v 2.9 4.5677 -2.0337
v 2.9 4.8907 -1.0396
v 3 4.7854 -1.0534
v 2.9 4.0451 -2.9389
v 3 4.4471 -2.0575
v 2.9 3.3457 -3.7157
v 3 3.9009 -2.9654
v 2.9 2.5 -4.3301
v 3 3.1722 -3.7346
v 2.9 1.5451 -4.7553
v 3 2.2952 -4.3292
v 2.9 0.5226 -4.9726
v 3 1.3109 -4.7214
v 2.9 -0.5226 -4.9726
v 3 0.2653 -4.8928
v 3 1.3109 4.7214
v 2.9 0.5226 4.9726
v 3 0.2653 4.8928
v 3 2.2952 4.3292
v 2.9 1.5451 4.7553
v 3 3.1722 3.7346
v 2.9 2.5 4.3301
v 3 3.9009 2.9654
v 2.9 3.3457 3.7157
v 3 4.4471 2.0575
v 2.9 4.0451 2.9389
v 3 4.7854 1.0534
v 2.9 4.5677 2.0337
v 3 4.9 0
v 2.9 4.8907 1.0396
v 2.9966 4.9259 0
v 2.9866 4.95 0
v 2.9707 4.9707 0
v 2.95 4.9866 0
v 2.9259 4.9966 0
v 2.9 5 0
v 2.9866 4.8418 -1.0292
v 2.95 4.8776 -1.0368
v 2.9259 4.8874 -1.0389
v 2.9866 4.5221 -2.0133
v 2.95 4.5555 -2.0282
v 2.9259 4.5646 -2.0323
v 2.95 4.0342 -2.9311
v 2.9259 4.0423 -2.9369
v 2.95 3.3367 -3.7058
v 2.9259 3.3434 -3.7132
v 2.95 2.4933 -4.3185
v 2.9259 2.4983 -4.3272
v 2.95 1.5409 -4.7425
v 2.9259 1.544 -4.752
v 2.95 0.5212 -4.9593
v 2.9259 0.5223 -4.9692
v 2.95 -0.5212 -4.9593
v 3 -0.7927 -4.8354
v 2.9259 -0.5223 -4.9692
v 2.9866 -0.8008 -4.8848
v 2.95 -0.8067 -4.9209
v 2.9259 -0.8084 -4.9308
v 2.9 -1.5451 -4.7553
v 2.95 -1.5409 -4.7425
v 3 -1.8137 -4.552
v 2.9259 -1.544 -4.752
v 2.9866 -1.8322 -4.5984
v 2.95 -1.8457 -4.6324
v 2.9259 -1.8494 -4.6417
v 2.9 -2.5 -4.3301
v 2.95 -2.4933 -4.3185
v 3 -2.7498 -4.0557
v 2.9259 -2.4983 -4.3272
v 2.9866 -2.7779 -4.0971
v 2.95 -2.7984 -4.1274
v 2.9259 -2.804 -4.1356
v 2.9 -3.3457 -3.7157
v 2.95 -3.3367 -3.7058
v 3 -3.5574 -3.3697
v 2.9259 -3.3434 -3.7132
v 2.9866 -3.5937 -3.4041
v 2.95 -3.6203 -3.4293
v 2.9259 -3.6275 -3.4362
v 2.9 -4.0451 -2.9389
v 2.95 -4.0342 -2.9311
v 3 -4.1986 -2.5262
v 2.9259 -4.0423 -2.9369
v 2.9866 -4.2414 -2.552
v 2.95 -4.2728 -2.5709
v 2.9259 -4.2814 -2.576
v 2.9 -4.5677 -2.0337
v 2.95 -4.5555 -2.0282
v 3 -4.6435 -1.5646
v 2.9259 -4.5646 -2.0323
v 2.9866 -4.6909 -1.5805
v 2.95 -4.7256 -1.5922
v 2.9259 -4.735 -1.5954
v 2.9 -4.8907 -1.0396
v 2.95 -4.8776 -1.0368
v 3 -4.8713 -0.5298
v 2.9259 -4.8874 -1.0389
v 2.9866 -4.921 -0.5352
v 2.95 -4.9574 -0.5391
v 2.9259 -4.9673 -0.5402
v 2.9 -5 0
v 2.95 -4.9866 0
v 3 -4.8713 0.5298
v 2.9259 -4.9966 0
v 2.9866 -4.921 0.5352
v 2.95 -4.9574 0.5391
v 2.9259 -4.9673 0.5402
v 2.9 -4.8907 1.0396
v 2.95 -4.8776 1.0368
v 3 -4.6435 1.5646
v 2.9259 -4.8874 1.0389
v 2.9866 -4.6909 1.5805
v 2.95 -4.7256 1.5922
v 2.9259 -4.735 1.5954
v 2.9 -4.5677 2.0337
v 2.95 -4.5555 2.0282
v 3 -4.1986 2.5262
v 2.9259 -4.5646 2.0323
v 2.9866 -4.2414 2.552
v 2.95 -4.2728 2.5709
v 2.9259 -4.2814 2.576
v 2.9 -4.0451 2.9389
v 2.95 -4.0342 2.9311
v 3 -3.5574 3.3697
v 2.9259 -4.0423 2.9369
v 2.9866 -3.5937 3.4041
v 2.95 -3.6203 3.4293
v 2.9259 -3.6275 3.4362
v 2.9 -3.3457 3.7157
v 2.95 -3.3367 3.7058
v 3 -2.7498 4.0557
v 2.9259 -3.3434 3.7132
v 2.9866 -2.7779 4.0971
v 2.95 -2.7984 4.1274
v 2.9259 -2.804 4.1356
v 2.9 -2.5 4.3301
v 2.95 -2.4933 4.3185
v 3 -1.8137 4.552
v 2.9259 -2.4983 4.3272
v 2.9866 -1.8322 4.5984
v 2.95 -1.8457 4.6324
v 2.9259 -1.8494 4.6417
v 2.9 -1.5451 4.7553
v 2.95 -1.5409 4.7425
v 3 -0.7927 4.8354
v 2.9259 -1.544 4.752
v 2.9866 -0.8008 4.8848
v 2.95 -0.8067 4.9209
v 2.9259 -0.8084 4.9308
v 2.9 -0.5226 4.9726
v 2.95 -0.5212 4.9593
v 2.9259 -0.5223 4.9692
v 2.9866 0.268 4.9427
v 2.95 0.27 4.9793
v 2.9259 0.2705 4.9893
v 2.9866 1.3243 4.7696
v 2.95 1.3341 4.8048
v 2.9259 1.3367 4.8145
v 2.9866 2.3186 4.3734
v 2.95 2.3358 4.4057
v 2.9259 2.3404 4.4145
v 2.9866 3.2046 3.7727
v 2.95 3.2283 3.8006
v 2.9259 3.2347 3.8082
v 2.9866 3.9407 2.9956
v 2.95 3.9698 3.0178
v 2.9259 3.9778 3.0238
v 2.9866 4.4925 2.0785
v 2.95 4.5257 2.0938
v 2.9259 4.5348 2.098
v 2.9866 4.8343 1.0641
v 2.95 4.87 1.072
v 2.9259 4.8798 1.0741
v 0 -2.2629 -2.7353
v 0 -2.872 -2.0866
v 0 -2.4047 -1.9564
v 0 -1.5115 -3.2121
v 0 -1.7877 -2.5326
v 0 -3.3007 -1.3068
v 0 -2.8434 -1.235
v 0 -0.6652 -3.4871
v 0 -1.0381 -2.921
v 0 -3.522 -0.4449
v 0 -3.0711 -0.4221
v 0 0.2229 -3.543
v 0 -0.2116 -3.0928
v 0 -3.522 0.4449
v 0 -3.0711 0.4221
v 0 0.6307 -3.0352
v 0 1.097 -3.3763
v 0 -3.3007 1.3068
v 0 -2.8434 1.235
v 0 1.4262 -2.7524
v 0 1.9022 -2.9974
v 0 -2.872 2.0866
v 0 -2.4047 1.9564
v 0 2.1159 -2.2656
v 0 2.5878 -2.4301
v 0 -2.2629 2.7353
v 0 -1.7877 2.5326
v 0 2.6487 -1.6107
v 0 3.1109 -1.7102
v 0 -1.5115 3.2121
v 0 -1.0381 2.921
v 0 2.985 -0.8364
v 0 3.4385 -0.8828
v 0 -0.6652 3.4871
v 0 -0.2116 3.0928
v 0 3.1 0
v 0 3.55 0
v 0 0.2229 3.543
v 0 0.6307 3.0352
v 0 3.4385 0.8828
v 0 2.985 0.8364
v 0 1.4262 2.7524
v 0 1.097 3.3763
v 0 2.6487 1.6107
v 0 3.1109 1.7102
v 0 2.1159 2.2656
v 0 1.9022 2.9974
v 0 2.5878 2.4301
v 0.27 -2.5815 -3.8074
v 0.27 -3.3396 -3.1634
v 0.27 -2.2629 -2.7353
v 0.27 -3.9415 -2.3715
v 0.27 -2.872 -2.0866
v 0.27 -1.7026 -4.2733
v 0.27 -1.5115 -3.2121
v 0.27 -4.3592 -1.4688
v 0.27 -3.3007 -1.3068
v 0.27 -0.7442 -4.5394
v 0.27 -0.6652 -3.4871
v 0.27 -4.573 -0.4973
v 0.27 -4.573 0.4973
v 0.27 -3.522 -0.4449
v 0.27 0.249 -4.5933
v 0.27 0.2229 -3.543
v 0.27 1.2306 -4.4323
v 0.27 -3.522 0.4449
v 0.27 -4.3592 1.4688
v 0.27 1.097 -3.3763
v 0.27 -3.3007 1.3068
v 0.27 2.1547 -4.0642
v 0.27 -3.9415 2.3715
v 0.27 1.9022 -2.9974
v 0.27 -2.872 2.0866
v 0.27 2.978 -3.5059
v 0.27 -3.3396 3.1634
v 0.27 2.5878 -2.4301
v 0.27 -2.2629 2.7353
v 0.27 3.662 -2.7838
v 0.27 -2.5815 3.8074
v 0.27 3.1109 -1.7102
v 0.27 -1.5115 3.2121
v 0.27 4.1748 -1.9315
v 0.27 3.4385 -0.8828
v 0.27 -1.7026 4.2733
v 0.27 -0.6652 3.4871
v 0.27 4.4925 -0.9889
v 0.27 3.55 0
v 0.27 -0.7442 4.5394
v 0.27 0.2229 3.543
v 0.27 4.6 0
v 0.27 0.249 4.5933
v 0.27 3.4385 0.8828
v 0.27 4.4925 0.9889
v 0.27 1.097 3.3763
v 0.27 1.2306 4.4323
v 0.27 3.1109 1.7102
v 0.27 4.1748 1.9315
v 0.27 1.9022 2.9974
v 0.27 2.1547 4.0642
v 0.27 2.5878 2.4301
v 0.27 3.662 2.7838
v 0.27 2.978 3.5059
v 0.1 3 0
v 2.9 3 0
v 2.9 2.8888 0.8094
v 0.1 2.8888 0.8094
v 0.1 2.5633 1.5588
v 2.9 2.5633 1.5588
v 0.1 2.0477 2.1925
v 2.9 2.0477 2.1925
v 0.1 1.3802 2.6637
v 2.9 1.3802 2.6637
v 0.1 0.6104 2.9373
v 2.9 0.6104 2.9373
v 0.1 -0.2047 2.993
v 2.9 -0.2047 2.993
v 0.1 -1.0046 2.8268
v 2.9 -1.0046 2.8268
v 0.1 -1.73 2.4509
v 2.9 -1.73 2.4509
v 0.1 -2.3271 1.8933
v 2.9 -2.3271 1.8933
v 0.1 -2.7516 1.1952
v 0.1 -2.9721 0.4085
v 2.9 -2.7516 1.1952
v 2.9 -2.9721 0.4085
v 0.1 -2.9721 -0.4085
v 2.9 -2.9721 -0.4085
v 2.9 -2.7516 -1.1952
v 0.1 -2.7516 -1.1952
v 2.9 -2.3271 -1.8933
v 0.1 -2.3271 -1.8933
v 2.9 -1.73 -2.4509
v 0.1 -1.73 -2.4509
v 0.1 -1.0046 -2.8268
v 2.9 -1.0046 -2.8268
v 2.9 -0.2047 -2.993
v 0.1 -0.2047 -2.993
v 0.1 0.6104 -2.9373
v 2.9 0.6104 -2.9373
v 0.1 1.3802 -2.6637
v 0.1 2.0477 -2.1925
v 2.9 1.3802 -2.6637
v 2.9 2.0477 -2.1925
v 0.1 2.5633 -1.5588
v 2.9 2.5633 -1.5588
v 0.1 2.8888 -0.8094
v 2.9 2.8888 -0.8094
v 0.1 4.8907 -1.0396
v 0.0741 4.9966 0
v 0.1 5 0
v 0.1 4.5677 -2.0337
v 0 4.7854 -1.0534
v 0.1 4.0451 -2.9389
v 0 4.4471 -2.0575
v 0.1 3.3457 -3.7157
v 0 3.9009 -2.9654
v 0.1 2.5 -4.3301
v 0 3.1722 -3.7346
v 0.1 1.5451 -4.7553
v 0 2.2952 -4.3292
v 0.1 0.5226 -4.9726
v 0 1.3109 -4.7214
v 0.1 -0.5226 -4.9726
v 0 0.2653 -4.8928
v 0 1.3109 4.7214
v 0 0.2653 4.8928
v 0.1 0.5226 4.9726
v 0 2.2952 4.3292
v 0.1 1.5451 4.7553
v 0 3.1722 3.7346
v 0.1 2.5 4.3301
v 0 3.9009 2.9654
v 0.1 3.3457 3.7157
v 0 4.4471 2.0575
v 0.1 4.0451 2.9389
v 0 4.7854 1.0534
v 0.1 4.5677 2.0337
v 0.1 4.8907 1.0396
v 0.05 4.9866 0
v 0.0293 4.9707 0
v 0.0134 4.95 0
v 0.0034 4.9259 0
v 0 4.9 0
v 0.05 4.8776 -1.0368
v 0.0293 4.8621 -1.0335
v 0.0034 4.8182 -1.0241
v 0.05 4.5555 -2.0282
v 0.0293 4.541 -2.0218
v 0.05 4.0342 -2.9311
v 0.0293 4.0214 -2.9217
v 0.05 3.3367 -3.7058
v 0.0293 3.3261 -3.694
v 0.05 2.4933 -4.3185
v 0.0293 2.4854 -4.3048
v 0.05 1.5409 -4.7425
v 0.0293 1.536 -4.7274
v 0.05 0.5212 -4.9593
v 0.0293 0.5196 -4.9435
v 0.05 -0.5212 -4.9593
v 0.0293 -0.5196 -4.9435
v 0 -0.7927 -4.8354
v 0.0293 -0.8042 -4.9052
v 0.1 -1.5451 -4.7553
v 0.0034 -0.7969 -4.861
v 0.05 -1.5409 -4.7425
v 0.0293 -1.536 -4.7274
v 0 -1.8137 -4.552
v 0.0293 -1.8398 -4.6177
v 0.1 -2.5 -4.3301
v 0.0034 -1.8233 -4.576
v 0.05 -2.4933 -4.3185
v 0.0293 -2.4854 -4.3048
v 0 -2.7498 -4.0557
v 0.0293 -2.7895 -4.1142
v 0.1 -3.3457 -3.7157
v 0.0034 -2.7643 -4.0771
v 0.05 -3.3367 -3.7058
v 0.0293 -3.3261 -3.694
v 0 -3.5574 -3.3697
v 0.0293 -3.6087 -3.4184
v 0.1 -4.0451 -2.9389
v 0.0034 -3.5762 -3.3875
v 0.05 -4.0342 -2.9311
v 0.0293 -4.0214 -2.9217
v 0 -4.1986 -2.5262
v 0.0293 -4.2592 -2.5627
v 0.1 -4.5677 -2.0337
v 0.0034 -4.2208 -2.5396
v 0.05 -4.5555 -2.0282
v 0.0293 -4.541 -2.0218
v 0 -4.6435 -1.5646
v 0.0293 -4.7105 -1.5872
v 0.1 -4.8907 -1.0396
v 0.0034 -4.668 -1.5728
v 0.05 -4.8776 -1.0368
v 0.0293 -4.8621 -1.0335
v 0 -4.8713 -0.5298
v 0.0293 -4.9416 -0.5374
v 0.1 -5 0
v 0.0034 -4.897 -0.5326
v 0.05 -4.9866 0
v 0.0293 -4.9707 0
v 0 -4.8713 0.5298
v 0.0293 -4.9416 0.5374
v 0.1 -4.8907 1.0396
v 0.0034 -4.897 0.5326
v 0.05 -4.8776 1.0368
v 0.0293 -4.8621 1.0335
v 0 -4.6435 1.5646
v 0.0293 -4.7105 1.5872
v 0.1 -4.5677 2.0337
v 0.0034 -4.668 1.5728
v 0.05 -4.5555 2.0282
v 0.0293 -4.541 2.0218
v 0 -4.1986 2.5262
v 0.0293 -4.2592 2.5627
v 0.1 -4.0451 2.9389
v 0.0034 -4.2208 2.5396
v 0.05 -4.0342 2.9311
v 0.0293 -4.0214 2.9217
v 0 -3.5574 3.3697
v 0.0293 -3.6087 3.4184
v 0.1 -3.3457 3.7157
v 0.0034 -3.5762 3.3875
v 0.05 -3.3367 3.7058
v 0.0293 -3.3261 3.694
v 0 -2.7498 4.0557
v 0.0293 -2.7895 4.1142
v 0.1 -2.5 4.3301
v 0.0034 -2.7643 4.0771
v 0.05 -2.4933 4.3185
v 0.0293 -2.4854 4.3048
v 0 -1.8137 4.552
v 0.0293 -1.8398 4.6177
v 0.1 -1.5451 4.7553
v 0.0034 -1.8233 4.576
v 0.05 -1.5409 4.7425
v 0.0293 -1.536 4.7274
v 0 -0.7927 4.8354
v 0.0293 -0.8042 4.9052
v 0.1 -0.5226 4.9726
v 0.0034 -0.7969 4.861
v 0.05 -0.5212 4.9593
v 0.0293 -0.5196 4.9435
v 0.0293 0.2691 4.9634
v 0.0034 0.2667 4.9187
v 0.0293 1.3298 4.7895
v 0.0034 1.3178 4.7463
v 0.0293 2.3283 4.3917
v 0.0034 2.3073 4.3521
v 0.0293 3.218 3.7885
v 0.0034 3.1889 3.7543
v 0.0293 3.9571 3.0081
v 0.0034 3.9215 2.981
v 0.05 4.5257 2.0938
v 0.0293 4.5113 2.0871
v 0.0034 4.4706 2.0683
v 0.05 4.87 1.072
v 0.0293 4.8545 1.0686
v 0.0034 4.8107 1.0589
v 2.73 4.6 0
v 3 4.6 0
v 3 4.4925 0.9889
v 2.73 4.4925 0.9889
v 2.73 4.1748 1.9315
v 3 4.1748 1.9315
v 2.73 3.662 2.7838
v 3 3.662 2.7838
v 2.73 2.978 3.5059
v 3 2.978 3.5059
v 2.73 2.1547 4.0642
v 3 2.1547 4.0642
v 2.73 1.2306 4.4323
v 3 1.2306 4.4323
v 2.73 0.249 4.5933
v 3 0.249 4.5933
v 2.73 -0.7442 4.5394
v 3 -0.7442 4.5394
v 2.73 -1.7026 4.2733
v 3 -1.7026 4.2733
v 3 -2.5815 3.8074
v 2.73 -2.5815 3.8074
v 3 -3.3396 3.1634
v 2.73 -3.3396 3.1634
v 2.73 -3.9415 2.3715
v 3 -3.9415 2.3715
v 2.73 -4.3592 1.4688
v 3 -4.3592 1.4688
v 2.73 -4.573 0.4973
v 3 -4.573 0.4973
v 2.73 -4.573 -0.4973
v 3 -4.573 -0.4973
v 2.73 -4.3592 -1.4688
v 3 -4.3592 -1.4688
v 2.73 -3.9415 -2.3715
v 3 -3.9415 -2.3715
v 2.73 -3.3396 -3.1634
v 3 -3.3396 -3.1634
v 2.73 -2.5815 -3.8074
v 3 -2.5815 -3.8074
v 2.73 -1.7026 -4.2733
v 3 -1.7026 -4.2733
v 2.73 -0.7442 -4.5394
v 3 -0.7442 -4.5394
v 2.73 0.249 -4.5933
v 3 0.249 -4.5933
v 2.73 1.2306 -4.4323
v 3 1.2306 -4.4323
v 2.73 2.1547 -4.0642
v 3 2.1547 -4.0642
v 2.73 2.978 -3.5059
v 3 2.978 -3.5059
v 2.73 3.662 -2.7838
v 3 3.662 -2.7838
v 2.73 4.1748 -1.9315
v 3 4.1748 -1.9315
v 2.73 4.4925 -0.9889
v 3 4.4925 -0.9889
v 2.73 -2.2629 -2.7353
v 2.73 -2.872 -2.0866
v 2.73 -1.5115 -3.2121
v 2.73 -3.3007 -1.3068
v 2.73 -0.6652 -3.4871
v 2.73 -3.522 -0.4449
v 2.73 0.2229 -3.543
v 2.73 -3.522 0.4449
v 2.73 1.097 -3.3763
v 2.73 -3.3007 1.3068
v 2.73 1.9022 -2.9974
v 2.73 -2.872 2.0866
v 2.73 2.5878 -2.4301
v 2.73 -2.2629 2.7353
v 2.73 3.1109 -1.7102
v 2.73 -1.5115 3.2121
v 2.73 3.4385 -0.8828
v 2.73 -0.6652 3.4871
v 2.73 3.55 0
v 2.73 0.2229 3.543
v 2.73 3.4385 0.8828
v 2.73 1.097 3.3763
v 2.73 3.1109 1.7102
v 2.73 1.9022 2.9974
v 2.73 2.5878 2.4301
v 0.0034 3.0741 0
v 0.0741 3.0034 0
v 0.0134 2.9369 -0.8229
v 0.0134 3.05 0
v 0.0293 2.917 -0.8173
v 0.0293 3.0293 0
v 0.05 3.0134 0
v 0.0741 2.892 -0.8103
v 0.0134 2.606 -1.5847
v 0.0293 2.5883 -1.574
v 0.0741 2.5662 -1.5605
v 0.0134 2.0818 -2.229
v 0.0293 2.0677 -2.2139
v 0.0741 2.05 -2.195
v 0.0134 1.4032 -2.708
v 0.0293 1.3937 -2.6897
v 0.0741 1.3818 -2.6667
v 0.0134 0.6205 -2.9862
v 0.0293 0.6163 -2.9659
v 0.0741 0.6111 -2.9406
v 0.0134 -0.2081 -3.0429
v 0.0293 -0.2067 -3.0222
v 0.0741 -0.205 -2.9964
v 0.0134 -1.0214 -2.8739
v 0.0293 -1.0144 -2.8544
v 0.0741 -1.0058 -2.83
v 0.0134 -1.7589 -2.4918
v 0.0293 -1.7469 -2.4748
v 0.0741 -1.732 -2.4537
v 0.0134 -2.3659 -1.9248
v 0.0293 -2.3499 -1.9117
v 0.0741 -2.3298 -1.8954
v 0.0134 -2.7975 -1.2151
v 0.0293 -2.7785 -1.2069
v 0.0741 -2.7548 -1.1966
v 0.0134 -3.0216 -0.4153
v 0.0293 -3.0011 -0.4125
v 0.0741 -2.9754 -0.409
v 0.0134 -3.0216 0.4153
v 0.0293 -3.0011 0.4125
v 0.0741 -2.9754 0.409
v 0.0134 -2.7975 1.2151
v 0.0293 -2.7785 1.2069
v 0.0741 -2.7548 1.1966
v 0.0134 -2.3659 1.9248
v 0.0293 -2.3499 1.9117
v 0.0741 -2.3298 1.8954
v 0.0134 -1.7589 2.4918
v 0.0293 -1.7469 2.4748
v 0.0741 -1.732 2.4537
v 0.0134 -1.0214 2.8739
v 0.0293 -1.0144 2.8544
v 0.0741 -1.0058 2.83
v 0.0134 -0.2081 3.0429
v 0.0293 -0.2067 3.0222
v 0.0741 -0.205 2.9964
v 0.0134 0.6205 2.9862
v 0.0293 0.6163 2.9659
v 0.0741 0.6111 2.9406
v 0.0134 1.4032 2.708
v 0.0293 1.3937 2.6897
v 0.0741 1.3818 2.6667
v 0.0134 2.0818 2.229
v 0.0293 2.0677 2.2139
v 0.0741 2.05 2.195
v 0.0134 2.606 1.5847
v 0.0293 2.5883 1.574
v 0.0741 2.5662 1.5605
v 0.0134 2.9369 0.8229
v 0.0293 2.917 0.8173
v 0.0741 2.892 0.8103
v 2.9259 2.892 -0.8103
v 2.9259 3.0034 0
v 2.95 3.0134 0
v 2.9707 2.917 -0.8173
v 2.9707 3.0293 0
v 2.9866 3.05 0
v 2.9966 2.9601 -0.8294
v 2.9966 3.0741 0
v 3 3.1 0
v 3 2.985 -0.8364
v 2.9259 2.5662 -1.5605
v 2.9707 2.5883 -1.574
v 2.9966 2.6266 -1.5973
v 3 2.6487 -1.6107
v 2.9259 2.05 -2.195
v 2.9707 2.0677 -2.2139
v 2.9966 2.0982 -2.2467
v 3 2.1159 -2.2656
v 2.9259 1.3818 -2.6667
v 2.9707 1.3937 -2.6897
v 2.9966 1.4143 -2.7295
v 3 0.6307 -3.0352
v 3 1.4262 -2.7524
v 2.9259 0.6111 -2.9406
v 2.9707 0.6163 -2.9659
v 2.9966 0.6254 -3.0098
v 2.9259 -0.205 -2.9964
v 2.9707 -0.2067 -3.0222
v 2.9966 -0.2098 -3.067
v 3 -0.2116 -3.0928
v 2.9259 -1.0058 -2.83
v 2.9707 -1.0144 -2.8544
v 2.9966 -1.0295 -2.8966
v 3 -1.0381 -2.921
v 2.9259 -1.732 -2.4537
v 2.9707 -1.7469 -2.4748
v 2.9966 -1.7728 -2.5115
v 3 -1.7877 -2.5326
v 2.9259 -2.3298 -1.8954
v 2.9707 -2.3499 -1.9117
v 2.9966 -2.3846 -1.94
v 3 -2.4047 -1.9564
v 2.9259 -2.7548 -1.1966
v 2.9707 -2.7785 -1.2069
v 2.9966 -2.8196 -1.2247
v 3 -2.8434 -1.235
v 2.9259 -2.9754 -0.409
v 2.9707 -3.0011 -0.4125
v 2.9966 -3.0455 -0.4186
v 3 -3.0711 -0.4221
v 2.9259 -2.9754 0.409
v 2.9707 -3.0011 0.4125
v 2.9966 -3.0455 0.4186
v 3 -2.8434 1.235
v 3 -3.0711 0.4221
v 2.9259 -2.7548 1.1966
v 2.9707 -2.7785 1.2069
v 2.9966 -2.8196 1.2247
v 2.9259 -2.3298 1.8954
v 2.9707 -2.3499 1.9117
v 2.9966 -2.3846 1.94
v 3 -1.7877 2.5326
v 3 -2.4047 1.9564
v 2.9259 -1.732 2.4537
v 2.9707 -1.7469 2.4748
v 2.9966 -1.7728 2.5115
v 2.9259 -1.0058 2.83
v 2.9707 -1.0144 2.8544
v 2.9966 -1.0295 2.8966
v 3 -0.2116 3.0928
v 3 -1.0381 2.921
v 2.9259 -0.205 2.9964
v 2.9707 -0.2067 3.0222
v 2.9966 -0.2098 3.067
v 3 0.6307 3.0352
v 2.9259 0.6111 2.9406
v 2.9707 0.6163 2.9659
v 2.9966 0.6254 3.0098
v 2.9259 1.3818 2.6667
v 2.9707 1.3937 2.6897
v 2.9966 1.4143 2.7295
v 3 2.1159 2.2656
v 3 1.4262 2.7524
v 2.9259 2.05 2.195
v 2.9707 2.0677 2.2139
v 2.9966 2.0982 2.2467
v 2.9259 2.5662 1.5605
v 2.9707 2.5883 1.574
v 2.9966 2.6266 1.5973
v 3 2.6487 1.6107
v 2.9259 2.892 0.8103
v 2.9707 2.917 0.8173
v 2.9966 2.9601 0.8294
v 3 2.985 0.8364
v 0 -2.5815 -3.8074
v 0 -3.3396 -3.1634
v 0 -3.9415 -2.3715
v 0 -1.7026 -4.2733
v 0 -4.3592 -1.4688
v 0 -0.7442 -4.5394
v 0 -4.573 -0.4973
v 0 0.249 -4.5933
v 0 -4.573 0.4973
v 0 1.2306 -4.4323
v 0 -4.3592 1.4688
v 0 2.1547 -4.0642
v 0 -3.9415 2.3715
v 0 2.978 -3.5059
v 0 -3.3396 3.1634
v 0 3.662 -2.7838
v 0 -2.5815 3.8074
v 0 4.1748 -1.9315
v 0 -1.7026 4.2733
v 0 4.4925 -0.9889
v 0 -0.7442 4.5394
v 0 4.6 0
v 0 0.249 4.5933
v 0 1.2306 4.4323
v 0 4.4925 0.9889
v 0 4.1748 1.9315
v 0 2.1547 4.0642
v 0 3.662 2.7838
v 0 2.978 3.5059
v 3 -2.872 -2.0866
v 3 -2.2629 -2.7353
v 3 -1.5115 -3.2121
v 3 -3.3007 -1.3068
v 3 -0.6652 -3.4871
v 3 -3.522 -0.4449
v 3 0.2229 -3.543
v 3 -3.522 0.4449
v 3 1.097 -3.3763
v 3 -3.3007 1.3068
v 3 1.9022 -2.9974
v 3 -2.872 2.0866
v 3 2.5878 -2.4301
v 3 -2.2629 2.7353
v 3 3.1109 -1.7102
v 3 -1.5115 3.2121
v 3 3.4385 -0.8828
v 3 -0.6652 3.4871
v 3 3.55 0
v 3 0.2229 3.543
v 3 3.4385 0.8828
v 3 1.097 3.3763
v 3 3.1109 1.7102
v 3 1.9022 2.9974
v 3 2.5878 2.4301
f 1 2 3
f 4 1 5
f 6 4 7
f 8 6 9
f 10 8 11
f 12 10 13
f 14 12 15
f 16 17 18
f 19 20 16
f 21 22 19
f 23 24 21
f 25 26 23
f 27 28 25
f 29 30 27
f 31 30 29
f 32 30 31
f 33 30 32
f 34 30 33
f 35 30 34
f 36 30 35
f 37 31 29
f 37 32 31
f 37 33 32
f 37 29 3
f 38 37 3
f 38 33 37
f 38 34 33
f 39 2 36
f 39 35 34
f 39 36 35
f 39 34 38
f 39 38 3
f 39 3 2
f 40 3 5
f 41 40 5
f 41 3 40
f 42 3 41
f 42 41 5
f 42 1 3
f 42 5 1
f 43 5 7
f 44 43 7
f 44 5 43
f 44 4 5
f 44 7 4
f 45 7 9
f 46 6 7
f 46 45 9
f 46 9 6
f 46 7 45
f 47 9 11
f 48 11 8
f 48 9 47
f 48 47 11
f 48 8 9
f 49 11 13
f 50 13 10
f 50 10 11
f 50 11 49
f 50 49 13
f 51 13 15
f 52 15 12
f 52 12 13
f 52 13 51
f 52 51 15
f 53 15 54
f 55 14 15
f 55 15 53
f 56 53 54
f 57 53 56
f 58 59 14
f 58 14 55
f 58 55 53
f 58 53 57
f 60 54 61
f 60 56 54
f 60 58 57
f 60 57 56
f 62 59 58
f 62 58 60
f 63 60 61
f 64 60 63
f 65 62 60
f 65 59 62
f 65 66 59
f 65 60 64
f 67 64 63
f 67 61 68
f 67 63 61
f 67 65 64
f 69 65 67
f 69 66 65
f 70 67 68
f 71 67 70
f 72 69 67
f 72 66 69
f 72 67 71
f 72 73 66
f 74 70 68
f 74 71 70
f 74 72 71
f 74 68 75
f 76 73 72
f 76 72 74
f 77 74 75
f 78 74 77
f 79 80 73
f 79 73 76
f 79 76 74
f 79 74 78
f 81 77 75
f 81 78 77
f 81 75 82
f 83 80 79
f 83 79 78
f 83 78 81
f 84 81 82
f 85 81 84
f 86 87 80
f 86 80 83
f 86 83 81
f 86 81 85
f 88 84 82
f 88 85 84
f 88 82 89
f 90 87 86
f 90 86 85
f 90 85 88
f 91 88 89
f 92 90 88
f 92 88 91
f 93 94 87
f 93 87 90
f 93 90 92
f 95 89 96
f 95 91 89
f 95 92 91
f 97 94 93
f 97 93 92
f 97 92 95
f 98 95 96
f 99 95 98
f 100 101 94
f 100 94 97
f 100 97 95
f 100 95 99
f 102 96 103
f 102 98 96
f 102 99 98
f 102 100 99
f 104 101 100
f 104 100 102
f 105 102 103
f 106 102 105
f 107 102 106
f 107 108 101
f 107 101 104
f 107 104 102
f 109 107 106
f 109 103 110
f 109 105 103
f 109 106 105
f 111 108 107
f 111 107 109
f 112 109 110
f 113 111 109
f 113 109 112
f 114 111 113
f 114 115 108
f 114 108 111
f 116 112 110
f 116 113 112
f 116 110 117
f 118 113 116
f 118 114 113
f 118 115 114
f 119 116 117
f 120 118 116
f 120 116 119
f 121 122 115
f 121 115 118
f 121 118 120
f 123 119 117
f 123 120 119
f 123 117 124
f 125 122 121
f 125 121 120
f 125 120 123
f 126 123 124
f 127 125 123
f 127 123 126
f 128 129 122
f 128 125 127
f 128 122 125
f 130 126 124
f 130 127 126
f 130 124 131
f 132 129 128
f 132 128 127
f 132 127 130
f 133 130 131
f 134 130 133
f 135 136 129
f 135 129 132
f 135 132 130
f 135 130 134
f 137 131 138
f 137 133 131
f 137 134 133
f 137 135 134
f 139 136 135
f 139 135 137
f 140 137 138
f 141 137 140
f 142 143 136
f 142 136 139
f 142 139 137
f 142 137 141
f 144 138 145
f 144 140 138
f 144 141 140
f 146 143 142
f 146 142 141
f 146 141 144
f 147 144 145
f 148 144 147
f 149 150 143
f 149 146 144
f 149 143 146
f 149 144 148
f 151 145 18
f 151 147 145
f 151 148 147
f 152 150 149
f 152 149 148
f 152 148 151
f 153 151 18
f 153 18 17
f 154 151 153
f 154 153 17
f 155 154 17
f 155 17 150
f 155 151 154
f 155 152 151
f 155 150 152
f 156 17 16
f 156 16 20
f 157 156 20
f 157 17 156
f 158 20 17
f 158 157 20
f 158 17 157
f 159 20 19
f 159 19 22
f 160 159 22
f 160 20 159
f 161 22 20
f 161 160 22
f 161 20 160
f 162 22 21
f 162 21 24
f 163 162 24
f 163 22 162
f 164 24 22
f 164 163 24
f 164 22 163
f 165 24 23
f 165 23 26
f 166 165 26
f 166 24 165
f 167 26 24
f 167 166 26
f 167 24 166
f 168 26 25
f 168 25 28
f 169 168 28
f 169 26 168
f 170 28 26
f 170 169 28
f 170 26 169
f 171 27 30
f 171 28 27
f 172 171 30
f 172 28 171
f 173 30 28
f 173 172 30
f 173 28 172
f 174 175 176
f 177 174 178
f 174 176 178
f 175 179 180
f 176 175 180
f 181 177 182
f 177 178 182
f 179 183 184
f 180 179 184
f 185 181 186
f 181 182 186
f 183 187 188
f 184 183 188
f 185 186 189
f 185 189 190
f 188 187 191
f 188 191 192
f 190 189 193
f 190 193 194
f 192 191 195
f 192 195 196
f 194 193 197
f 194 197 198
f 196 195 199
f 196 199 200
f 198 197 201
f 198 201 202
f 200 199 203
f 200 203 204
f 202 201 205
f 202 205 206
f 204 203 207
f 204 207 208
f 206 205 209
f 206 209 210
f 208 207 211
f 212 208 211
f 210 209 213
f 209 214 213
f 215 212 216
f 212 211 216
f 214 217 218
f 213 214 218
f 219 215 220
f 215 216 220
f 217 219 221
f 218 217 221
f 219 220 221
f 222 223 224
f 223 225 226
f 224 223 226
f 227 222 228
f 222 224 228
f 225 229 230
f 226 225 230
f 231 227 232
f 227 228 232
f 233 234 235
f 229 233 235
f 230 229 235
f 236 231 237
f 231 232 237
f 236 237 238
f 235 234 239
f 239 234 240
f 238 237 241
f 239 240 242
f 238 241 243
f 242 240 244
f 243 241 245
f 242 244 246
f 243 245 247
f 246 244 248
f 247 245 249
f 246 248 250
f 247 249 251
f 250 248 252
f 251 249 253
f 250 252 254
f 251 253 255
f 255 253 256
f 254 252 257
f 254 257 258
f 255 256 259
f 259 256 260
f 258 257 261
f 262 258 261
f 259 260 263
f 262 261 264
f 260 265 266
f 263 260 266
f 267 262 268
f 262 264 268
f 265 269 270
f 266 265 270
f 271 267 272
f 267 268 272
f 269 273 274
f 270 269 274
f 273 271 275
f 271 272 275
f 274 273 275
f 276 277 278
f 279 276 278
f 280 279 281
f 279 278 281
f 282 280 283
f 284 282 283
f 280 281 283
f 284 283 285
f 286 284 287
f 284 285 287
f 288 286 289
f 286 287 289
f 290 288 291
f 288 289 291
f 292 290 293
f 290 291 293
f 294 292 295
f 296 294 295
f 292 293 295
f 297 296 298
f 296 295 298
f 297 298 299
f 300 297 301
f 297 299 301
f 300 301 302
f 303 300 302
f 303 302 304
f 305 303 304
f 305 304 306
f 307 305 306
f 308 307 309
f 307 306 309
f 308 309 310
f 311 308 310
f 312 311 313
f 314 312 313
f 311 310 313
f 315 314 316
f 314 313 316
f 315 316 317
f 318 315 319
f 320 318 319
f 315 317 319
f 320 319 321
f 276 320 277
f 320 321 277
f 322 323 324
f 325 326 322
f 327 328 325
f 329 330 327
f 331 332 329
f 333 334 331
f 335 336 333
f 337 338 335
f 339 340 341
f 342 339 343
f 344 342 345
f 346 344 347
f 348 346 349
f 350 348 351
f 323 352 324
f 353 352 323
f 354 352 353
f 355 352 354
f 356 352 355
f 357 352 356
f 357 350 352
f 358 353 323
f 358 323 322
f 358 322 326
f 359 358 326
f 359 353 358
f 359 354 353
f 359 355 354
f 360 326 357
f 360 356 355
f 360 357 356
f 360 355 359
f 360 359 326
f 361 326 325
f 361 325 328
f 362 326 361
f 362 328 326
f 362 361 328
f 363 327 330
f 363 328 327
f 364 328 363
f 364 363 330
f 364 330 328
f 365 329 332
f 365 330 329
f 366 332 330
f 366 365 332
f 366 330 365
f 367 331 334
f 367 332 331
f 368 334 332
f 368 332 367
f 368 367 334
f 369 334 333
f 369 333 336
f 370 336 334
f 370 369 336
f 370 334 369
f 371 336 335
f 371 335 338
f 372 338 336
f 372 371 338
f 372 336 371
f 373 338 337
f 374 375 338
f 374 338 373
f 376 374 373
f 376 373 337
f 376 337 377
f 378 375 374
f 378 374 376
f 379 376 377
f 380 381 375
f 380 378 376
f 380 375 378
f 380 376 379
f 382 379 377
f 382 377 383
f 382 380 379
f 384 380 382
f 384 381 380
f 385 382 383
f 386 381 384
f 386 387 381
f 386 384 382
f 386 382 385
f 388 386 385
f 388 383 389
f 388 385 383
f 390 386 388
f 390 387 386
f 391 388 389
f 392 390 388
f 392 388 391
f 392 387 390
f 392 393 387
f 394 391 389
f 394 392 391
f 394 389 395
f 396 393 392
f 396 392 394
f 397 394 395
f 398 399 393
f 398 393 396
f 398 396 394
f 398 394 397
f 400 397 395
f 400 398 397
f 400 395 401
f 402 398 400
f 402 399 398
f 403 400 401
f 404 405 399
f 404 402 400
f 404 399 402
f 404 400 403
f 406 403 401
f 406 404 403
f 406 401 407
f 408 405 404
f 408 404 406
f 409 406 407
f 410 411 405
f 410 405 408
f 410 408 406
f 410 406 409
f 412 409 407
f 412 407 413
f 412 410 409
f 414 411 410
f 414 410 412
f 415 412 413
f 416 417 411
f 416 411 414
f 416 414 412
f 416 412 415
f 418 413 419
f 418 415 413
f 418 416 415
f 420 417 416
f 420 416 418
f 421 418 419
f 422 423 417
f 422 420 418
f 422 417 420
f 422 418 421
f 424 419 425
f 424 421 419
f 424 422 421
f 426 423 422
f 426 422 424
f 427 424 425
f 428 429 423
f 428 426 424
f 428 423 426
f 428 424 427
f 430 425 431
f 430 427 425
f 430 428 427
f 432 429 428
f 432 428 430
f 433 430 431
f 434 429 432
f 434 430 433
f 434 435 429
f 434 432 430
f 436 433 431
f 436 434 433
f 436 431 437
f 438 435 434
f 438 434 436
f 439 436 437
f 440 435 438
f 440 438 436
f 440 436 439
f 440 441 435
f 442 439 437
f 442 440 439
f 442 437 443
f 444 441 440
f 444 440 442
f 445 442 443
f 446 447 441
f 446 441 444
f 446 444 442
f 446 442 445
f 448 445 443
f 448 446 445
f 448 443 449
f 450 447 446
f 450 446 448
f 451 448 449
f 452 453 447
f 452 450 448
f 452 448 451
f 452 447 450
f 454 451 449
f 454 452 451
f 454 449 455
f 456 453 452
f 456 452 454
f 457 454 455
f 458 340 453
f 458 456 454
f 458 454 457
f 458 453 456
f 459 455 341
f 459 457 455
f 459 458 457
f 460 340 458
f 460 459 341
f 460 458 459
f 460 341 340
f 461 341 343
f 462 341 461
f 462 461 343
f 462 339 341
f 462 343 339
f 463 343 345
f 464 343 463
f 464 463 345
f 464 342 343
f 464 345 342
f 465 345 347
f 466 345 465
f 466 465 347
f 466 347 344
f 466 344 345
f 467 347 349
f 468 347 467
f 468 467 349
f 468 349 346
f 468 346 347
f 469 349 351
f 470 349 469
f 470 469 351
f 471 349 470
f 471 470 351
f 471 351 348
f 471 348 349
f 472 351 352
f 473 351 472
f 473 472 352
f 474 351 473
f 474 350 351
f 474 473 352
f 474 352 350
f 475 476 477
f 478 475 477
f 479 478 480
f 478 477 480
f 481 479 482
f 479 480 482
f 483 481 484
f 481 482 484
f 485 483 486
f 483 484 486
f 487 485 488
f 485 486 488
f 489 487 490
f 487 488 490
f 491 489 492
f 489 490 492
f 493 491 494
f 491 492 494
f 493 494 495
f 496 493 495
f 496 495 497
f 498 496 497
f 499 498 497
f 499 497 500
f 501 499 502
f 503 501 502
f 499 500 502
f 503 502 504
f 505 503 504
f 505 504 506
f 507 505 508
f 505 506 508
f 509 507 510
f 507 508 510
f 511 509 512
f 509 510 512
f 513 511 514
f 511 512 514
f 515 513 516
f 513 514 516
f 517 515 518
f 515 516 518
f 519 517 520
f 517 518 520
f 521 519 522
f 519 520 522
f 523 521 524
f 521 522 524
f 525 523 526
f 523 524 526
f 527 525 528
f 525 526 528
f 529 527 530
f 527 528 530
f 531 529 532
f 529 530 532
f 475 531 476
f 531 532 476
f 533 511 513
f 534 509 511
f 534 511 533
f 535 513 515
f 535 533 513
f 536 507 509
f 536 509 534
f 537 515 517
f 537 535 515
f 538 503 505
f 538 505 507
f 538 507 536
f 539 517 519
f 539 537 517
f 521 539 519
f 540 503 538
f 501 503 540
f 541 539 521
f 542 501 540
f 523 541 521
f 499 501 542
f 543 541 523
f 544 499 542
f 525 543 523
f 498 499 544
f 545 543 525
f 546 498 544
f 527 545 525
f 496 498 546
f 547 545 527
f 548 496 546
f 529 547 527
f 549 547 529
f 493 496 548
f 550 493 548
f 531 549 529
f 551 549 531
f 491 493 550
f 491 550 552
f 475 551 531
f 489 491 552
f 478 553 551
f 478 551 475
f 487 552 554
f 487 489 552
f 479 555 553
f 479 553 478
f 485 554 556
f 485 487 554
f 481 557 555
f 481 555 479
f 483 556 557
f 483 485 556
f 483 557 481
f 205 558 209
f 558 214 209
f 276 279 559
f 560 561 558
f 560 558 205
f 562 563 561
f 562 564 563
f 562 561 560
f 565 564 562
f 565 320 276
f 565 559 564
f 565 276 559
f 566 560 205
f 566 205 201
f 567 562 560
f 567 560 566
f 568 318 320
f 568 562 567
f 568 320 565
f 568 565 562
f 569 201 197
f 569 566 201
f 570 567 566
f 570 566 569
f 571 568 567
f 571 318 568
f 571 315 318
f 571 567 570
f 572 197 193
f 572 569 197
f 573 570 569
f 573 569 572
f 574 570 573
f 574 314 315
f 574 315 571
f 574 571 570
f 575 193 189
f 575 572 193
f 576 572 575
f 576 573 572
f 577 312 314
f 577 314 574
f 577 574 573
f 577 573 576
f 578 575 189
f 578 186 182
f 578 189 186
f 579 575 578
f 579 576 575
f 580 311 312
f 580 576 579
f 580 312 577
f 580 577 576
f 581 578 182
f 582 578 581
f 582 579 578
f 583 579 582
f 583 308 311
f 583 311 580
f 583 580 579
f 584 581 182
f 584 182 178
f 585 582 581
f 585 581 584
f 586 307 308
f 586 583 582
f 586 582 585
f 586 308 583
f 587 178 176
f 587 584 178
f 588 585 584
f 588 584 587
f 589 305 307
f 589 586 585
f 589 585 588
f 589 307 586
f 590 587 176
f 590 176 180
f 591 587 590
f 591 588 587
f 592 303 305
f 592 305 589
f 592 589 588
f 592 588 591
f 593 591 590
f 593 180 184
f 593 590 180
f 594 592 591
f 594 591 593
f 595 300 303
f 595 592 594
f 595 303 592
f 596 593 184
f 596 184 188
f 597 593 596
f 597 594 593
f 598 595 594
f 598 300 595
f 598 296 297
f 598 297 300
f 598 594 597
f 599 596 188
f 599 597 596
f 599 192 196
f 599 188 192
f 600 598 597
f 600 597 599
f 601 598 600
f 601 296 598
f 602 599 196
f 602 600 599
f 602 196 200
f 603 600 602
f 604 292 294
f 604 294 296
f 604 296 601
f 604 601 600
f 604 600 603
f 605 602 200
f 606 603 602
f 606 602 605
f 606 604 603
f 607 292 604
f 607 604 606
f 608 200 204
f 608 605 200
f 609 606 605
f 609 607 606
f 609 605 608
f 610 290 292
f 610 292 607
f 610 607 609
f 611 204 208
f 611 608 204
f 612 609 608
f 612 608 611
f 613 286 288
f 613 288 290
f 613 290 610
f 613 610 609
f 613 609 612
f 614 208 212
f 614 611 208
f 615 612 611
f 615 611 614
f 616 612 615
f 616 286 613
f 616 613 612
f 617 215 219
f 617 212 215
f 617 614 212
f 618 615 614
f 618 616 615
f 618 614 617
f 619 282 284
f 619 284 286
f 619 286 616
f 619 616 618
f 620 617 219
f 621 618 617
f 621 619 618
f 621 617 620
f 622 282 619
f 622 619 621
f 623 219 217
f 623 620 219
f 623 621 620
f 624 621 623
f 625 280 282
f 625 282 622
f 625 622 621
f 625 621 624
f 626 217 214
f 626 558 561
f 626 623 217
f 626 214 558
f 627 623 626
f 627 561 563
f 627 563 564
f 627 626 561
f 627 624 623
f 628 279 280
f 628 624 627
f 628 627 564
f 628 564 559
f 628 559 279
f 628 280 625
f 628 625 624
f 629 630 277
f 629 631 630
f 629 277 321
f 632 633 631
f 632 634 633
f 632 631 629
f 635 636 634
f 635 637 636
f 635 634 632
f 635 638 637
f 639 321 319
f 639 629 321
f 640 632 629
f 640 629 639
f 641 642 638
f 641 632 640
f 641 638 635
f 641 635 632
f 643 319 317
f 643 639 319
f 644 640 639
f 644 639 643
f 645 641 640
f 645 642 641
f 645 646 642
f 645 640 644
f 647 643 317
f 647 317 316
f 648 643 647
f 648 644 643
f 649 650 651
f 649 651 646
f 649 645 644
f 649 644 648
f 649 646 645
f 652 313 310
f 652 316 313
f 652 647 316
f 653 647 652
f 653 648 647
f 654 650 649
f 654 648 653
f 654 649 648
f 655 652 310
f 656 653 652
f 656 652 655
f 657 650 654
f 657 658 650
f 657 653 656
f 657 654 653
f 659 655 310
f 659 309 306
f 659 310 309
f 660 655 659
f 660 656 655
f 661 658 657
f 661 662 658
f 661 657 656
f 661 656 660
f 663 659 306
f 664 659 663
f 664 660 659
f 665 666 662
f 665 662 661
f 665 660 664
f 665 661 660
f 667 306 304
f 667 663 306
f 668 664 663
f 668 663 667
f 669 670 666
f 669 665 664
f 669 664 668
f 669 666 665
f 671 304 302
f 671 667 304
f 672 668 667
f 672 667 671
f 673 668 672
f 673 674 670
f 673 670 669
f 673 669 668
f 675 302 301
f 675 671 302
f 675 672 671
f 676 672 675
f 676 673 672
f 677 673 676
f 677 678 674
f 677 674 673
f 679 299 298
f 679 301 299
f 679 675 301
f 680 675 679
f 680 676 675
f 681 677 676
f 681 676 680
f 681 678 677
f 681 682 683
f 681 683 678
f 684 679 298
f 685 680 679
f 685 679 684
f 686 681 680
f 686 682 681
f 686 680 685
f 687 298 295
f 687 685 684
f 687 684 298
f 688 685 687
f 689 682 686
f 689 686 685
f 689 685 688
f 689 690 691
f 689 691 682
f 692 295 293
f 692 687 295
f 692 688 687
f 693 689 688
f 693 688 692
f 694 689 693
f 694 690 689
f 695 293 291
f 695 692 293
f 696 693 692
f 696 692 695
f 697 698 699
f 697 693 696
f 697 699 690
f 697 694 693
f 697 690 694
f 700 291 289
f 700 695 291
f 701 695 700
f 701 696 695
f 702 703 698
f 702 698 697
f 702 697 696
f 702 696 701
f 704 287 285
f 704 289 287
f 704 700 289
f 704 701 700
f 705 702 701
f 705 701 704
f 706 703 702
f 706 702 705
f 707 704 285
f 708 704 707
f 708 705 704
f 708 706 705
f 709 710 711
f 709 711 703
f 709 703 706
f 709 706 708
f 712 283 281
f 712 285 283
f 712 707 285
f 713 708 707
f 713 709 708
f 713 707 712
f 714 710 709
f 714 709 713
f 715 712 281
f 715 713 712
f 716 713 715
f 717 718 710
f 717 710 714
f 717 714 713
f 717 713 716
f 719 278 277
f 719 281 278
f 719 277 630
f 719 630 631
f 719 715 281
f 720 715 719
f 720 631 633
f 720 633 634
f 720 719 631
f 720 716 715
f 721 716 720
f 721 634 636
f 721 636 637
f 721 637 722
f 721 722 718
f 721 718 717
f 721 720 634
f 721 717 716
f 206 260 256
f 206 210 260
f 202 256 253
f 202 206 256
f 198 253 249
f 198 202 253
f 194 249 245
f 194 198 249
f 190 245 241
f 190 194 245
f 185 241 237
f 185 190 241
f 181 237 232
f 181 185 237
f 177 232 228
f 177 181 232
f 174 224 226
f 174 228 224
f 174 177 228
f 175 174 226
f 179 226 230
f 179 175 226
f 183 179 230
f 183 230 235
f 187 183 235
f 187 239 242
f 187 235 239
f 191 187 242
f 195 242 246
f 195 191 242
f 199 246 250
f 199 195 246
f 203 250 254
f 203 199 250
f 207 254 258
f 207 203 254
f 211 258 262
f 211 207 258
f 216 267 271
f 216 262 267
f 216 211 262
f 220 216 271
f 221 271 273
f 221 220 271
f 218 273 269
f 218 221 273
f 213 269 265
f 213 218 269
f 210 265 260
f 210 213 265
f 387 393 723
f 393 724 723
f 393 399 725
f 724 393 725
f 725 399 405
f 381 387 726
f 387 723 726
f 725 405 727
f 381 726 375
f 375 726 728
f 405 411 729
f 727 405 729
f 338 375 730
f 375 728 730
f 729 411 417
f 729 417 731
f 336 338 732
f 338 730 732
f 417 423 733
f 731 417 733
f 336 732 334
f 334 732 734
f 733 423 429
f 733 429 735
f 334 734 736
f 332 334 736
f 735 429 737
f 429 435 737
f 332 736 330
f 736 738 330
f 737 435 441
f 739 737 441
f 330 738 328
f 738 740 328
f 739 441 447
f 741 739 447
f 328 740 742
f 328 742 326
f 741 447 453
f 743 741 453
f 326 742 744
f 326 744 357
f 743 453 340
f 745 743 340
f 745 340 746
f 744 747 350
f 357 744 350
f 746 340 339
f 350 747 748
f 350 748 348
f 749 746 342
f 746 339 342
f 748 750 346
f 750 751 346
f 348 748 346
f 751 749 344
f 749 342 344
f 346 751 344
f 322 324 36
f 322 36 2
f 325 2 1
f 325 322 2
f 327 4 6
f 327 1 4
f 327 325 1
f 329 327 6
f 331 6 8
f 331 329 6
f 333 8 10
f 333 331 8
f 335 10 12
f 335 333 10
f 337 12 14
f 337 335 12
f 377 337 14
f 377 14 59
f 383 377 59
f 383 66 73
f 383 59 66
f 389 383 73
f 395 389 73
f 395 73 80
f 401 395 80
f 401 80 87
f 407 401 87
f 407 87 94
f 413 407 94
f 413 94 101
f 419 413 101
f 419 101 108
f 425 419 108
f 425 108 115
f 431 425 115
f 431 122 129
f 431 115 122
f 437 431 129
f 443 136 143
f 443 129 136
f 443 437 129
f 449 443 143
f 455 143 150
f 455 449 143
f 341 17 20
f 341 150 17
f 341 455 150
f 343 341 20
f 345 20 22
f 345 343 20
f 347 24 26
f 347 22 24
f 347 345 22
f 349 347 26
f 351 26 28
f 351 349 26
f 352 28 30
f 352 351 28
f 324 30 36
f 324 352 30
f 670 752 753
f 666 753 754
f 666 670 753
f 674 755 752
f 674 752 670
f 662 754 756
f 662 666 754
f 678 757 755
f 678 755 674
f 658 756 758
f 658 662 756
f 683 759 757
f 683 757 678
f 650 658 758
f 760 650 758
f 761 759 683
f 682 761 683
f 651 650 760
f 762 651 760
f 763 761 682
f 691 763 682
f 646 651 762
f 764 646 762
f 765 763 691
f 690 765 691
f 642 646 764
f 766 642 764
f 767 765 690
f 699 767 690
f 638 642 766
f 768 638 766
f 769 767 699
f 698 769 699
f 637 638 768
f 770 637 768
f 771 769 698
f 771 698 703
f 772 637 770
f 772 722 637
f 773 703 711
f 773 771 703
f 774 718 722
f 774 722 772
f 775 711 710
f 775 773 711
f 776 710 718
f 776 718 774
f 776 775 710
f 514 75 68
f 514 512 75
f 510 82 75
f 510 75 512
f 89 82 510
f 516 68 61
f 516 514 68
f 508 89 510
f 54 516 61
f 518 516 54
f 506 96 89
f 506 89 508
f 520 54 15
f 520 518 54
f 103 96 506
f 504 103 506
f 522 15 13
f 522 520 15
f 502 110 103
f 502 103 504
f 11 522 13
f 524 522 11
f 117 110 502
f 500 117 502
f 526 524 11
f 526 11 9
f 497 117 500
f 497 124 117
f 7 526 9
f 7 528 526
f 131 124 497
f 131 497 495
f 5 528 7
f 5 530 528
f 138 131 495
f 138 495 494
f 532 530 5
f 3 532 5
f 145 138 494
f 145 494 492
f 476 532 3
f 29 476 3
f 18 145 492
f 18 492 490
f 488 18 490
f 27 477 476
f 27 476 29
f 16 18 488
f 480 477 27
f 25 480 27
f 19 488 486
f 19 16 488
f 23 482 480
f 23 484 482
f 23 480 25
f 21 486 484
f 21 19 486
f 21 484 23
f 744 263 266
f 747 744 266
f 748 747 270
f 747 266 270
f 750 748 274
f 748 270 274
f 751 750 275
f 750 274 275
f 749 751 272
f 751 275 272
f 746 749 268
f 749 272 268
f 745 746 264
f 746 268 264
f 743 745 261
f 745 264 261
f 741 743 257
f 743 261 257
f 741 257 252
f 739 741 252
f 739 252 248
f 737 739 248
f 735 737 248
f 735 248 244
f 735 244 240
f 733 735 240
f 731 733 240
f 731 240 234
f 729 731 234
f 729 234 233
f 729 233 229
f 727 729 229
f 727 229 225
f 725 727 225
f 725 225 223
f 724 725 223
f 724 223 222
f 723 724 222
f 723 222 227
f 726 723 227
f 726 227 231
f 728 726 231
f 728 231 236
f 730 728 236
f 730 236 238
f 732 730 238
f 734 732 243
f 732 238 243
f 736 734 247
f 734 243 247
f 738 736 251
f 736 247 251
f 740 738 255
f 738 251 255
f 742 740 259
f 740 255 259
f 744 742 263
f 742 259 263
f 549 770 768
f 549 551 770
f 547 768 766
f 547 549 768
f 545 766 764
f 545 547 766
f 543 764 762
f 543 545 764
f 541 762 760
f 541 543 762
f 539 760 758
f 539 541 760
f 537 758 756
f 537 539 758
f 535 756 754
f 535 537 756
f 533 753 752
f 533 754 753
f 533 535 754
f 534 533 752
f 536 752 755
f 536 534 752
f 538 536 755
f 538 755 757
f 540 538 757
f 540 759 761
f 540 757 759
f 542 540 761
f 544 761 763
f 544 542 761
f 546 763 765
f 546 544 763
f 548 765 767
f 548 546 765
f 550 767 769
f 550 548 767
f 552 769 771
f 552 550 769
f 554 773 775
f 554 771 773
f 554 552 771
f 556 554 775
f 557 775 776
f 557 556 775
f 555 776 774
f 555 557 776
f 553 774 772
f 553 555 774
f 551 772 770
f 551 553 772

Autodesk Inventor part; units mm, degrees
sketch "Sketch_1" plane through (0, 0, 0) normal (0, 0, 1) x (1, 0, 0)
  line L0 (2.9, 0) -> (0.1, 0)
  arc A0 (0, 3.1) -> (0.1, 3) centre (0.1, 3.1) ccw
  line L1 (0.1, 3) -> (2.9, 3)
  arc A1 (2.9, 3) -> (3, 3.1) centre (2.9, 3.1) ccw
  line L2 (3, 3.1) -> (3, 3.55)
  line L3 (3, 3.55) -> (2.73, 3.55)
  line L4 (2.73, 3.55) -> (2.73, 4.6)
  line L5 (2.73, 4.6) -> (3, 4.6)
  line L6 (3, 4.6) -> (3, 4.9)
  arc A2 (3, 4.9) -> (2.9, 5) centre (2.9, 4.9) ccw
  line L7 (2.9, 5) -> (0.1, 5)
  arc A3 (0.1, 5) -> (0, 4.9) centre (0.1, 4.9) ccw
  line L8 (0, 4.9) -> (0, 4.6)
  line L9 (0, 4.6) -> (0.27, 4.6)
  line L10 (0.27, 4.6) -> (0.27, 3.55)
  line L11 (0.27, 3.55) -> (0, 3.55)
  line L12 (0, 3.55) -> (0, 3.1)
revolve "Revolution1" add sketch "Sketch_1" angle 360 about axis through (2.9, 0, 0) along (1, 0, 0)
ref_plane "to_housing_XY" through (0, 0, 0) normal (1, 0, 0) x (0, 0, -1)
ref_plane "to_housing_YZ" through (0, 0, 0) normal (0, 0, -1) x (0, 1, 0)
ref_plane "to_housing_ZX" through (0, 0, 0) normal (0, 1, 0) x (1, 0, 0)
ref_plane "to_housing_center_XY" through (1.5, 0, 0) normal (1, 0, 0) x (0, 0, -1)
ref_plane "to_housing_center_YZ" through (1.5, 0, 0) normal (0, 0, -1) x (0, 1, 0)
ref_plane "to_housing_center_ZX" through (1.5, 0, 0) normal (0, 1, 0) x (1, 0, 0)
properties part number "C-SE676ZZ"
